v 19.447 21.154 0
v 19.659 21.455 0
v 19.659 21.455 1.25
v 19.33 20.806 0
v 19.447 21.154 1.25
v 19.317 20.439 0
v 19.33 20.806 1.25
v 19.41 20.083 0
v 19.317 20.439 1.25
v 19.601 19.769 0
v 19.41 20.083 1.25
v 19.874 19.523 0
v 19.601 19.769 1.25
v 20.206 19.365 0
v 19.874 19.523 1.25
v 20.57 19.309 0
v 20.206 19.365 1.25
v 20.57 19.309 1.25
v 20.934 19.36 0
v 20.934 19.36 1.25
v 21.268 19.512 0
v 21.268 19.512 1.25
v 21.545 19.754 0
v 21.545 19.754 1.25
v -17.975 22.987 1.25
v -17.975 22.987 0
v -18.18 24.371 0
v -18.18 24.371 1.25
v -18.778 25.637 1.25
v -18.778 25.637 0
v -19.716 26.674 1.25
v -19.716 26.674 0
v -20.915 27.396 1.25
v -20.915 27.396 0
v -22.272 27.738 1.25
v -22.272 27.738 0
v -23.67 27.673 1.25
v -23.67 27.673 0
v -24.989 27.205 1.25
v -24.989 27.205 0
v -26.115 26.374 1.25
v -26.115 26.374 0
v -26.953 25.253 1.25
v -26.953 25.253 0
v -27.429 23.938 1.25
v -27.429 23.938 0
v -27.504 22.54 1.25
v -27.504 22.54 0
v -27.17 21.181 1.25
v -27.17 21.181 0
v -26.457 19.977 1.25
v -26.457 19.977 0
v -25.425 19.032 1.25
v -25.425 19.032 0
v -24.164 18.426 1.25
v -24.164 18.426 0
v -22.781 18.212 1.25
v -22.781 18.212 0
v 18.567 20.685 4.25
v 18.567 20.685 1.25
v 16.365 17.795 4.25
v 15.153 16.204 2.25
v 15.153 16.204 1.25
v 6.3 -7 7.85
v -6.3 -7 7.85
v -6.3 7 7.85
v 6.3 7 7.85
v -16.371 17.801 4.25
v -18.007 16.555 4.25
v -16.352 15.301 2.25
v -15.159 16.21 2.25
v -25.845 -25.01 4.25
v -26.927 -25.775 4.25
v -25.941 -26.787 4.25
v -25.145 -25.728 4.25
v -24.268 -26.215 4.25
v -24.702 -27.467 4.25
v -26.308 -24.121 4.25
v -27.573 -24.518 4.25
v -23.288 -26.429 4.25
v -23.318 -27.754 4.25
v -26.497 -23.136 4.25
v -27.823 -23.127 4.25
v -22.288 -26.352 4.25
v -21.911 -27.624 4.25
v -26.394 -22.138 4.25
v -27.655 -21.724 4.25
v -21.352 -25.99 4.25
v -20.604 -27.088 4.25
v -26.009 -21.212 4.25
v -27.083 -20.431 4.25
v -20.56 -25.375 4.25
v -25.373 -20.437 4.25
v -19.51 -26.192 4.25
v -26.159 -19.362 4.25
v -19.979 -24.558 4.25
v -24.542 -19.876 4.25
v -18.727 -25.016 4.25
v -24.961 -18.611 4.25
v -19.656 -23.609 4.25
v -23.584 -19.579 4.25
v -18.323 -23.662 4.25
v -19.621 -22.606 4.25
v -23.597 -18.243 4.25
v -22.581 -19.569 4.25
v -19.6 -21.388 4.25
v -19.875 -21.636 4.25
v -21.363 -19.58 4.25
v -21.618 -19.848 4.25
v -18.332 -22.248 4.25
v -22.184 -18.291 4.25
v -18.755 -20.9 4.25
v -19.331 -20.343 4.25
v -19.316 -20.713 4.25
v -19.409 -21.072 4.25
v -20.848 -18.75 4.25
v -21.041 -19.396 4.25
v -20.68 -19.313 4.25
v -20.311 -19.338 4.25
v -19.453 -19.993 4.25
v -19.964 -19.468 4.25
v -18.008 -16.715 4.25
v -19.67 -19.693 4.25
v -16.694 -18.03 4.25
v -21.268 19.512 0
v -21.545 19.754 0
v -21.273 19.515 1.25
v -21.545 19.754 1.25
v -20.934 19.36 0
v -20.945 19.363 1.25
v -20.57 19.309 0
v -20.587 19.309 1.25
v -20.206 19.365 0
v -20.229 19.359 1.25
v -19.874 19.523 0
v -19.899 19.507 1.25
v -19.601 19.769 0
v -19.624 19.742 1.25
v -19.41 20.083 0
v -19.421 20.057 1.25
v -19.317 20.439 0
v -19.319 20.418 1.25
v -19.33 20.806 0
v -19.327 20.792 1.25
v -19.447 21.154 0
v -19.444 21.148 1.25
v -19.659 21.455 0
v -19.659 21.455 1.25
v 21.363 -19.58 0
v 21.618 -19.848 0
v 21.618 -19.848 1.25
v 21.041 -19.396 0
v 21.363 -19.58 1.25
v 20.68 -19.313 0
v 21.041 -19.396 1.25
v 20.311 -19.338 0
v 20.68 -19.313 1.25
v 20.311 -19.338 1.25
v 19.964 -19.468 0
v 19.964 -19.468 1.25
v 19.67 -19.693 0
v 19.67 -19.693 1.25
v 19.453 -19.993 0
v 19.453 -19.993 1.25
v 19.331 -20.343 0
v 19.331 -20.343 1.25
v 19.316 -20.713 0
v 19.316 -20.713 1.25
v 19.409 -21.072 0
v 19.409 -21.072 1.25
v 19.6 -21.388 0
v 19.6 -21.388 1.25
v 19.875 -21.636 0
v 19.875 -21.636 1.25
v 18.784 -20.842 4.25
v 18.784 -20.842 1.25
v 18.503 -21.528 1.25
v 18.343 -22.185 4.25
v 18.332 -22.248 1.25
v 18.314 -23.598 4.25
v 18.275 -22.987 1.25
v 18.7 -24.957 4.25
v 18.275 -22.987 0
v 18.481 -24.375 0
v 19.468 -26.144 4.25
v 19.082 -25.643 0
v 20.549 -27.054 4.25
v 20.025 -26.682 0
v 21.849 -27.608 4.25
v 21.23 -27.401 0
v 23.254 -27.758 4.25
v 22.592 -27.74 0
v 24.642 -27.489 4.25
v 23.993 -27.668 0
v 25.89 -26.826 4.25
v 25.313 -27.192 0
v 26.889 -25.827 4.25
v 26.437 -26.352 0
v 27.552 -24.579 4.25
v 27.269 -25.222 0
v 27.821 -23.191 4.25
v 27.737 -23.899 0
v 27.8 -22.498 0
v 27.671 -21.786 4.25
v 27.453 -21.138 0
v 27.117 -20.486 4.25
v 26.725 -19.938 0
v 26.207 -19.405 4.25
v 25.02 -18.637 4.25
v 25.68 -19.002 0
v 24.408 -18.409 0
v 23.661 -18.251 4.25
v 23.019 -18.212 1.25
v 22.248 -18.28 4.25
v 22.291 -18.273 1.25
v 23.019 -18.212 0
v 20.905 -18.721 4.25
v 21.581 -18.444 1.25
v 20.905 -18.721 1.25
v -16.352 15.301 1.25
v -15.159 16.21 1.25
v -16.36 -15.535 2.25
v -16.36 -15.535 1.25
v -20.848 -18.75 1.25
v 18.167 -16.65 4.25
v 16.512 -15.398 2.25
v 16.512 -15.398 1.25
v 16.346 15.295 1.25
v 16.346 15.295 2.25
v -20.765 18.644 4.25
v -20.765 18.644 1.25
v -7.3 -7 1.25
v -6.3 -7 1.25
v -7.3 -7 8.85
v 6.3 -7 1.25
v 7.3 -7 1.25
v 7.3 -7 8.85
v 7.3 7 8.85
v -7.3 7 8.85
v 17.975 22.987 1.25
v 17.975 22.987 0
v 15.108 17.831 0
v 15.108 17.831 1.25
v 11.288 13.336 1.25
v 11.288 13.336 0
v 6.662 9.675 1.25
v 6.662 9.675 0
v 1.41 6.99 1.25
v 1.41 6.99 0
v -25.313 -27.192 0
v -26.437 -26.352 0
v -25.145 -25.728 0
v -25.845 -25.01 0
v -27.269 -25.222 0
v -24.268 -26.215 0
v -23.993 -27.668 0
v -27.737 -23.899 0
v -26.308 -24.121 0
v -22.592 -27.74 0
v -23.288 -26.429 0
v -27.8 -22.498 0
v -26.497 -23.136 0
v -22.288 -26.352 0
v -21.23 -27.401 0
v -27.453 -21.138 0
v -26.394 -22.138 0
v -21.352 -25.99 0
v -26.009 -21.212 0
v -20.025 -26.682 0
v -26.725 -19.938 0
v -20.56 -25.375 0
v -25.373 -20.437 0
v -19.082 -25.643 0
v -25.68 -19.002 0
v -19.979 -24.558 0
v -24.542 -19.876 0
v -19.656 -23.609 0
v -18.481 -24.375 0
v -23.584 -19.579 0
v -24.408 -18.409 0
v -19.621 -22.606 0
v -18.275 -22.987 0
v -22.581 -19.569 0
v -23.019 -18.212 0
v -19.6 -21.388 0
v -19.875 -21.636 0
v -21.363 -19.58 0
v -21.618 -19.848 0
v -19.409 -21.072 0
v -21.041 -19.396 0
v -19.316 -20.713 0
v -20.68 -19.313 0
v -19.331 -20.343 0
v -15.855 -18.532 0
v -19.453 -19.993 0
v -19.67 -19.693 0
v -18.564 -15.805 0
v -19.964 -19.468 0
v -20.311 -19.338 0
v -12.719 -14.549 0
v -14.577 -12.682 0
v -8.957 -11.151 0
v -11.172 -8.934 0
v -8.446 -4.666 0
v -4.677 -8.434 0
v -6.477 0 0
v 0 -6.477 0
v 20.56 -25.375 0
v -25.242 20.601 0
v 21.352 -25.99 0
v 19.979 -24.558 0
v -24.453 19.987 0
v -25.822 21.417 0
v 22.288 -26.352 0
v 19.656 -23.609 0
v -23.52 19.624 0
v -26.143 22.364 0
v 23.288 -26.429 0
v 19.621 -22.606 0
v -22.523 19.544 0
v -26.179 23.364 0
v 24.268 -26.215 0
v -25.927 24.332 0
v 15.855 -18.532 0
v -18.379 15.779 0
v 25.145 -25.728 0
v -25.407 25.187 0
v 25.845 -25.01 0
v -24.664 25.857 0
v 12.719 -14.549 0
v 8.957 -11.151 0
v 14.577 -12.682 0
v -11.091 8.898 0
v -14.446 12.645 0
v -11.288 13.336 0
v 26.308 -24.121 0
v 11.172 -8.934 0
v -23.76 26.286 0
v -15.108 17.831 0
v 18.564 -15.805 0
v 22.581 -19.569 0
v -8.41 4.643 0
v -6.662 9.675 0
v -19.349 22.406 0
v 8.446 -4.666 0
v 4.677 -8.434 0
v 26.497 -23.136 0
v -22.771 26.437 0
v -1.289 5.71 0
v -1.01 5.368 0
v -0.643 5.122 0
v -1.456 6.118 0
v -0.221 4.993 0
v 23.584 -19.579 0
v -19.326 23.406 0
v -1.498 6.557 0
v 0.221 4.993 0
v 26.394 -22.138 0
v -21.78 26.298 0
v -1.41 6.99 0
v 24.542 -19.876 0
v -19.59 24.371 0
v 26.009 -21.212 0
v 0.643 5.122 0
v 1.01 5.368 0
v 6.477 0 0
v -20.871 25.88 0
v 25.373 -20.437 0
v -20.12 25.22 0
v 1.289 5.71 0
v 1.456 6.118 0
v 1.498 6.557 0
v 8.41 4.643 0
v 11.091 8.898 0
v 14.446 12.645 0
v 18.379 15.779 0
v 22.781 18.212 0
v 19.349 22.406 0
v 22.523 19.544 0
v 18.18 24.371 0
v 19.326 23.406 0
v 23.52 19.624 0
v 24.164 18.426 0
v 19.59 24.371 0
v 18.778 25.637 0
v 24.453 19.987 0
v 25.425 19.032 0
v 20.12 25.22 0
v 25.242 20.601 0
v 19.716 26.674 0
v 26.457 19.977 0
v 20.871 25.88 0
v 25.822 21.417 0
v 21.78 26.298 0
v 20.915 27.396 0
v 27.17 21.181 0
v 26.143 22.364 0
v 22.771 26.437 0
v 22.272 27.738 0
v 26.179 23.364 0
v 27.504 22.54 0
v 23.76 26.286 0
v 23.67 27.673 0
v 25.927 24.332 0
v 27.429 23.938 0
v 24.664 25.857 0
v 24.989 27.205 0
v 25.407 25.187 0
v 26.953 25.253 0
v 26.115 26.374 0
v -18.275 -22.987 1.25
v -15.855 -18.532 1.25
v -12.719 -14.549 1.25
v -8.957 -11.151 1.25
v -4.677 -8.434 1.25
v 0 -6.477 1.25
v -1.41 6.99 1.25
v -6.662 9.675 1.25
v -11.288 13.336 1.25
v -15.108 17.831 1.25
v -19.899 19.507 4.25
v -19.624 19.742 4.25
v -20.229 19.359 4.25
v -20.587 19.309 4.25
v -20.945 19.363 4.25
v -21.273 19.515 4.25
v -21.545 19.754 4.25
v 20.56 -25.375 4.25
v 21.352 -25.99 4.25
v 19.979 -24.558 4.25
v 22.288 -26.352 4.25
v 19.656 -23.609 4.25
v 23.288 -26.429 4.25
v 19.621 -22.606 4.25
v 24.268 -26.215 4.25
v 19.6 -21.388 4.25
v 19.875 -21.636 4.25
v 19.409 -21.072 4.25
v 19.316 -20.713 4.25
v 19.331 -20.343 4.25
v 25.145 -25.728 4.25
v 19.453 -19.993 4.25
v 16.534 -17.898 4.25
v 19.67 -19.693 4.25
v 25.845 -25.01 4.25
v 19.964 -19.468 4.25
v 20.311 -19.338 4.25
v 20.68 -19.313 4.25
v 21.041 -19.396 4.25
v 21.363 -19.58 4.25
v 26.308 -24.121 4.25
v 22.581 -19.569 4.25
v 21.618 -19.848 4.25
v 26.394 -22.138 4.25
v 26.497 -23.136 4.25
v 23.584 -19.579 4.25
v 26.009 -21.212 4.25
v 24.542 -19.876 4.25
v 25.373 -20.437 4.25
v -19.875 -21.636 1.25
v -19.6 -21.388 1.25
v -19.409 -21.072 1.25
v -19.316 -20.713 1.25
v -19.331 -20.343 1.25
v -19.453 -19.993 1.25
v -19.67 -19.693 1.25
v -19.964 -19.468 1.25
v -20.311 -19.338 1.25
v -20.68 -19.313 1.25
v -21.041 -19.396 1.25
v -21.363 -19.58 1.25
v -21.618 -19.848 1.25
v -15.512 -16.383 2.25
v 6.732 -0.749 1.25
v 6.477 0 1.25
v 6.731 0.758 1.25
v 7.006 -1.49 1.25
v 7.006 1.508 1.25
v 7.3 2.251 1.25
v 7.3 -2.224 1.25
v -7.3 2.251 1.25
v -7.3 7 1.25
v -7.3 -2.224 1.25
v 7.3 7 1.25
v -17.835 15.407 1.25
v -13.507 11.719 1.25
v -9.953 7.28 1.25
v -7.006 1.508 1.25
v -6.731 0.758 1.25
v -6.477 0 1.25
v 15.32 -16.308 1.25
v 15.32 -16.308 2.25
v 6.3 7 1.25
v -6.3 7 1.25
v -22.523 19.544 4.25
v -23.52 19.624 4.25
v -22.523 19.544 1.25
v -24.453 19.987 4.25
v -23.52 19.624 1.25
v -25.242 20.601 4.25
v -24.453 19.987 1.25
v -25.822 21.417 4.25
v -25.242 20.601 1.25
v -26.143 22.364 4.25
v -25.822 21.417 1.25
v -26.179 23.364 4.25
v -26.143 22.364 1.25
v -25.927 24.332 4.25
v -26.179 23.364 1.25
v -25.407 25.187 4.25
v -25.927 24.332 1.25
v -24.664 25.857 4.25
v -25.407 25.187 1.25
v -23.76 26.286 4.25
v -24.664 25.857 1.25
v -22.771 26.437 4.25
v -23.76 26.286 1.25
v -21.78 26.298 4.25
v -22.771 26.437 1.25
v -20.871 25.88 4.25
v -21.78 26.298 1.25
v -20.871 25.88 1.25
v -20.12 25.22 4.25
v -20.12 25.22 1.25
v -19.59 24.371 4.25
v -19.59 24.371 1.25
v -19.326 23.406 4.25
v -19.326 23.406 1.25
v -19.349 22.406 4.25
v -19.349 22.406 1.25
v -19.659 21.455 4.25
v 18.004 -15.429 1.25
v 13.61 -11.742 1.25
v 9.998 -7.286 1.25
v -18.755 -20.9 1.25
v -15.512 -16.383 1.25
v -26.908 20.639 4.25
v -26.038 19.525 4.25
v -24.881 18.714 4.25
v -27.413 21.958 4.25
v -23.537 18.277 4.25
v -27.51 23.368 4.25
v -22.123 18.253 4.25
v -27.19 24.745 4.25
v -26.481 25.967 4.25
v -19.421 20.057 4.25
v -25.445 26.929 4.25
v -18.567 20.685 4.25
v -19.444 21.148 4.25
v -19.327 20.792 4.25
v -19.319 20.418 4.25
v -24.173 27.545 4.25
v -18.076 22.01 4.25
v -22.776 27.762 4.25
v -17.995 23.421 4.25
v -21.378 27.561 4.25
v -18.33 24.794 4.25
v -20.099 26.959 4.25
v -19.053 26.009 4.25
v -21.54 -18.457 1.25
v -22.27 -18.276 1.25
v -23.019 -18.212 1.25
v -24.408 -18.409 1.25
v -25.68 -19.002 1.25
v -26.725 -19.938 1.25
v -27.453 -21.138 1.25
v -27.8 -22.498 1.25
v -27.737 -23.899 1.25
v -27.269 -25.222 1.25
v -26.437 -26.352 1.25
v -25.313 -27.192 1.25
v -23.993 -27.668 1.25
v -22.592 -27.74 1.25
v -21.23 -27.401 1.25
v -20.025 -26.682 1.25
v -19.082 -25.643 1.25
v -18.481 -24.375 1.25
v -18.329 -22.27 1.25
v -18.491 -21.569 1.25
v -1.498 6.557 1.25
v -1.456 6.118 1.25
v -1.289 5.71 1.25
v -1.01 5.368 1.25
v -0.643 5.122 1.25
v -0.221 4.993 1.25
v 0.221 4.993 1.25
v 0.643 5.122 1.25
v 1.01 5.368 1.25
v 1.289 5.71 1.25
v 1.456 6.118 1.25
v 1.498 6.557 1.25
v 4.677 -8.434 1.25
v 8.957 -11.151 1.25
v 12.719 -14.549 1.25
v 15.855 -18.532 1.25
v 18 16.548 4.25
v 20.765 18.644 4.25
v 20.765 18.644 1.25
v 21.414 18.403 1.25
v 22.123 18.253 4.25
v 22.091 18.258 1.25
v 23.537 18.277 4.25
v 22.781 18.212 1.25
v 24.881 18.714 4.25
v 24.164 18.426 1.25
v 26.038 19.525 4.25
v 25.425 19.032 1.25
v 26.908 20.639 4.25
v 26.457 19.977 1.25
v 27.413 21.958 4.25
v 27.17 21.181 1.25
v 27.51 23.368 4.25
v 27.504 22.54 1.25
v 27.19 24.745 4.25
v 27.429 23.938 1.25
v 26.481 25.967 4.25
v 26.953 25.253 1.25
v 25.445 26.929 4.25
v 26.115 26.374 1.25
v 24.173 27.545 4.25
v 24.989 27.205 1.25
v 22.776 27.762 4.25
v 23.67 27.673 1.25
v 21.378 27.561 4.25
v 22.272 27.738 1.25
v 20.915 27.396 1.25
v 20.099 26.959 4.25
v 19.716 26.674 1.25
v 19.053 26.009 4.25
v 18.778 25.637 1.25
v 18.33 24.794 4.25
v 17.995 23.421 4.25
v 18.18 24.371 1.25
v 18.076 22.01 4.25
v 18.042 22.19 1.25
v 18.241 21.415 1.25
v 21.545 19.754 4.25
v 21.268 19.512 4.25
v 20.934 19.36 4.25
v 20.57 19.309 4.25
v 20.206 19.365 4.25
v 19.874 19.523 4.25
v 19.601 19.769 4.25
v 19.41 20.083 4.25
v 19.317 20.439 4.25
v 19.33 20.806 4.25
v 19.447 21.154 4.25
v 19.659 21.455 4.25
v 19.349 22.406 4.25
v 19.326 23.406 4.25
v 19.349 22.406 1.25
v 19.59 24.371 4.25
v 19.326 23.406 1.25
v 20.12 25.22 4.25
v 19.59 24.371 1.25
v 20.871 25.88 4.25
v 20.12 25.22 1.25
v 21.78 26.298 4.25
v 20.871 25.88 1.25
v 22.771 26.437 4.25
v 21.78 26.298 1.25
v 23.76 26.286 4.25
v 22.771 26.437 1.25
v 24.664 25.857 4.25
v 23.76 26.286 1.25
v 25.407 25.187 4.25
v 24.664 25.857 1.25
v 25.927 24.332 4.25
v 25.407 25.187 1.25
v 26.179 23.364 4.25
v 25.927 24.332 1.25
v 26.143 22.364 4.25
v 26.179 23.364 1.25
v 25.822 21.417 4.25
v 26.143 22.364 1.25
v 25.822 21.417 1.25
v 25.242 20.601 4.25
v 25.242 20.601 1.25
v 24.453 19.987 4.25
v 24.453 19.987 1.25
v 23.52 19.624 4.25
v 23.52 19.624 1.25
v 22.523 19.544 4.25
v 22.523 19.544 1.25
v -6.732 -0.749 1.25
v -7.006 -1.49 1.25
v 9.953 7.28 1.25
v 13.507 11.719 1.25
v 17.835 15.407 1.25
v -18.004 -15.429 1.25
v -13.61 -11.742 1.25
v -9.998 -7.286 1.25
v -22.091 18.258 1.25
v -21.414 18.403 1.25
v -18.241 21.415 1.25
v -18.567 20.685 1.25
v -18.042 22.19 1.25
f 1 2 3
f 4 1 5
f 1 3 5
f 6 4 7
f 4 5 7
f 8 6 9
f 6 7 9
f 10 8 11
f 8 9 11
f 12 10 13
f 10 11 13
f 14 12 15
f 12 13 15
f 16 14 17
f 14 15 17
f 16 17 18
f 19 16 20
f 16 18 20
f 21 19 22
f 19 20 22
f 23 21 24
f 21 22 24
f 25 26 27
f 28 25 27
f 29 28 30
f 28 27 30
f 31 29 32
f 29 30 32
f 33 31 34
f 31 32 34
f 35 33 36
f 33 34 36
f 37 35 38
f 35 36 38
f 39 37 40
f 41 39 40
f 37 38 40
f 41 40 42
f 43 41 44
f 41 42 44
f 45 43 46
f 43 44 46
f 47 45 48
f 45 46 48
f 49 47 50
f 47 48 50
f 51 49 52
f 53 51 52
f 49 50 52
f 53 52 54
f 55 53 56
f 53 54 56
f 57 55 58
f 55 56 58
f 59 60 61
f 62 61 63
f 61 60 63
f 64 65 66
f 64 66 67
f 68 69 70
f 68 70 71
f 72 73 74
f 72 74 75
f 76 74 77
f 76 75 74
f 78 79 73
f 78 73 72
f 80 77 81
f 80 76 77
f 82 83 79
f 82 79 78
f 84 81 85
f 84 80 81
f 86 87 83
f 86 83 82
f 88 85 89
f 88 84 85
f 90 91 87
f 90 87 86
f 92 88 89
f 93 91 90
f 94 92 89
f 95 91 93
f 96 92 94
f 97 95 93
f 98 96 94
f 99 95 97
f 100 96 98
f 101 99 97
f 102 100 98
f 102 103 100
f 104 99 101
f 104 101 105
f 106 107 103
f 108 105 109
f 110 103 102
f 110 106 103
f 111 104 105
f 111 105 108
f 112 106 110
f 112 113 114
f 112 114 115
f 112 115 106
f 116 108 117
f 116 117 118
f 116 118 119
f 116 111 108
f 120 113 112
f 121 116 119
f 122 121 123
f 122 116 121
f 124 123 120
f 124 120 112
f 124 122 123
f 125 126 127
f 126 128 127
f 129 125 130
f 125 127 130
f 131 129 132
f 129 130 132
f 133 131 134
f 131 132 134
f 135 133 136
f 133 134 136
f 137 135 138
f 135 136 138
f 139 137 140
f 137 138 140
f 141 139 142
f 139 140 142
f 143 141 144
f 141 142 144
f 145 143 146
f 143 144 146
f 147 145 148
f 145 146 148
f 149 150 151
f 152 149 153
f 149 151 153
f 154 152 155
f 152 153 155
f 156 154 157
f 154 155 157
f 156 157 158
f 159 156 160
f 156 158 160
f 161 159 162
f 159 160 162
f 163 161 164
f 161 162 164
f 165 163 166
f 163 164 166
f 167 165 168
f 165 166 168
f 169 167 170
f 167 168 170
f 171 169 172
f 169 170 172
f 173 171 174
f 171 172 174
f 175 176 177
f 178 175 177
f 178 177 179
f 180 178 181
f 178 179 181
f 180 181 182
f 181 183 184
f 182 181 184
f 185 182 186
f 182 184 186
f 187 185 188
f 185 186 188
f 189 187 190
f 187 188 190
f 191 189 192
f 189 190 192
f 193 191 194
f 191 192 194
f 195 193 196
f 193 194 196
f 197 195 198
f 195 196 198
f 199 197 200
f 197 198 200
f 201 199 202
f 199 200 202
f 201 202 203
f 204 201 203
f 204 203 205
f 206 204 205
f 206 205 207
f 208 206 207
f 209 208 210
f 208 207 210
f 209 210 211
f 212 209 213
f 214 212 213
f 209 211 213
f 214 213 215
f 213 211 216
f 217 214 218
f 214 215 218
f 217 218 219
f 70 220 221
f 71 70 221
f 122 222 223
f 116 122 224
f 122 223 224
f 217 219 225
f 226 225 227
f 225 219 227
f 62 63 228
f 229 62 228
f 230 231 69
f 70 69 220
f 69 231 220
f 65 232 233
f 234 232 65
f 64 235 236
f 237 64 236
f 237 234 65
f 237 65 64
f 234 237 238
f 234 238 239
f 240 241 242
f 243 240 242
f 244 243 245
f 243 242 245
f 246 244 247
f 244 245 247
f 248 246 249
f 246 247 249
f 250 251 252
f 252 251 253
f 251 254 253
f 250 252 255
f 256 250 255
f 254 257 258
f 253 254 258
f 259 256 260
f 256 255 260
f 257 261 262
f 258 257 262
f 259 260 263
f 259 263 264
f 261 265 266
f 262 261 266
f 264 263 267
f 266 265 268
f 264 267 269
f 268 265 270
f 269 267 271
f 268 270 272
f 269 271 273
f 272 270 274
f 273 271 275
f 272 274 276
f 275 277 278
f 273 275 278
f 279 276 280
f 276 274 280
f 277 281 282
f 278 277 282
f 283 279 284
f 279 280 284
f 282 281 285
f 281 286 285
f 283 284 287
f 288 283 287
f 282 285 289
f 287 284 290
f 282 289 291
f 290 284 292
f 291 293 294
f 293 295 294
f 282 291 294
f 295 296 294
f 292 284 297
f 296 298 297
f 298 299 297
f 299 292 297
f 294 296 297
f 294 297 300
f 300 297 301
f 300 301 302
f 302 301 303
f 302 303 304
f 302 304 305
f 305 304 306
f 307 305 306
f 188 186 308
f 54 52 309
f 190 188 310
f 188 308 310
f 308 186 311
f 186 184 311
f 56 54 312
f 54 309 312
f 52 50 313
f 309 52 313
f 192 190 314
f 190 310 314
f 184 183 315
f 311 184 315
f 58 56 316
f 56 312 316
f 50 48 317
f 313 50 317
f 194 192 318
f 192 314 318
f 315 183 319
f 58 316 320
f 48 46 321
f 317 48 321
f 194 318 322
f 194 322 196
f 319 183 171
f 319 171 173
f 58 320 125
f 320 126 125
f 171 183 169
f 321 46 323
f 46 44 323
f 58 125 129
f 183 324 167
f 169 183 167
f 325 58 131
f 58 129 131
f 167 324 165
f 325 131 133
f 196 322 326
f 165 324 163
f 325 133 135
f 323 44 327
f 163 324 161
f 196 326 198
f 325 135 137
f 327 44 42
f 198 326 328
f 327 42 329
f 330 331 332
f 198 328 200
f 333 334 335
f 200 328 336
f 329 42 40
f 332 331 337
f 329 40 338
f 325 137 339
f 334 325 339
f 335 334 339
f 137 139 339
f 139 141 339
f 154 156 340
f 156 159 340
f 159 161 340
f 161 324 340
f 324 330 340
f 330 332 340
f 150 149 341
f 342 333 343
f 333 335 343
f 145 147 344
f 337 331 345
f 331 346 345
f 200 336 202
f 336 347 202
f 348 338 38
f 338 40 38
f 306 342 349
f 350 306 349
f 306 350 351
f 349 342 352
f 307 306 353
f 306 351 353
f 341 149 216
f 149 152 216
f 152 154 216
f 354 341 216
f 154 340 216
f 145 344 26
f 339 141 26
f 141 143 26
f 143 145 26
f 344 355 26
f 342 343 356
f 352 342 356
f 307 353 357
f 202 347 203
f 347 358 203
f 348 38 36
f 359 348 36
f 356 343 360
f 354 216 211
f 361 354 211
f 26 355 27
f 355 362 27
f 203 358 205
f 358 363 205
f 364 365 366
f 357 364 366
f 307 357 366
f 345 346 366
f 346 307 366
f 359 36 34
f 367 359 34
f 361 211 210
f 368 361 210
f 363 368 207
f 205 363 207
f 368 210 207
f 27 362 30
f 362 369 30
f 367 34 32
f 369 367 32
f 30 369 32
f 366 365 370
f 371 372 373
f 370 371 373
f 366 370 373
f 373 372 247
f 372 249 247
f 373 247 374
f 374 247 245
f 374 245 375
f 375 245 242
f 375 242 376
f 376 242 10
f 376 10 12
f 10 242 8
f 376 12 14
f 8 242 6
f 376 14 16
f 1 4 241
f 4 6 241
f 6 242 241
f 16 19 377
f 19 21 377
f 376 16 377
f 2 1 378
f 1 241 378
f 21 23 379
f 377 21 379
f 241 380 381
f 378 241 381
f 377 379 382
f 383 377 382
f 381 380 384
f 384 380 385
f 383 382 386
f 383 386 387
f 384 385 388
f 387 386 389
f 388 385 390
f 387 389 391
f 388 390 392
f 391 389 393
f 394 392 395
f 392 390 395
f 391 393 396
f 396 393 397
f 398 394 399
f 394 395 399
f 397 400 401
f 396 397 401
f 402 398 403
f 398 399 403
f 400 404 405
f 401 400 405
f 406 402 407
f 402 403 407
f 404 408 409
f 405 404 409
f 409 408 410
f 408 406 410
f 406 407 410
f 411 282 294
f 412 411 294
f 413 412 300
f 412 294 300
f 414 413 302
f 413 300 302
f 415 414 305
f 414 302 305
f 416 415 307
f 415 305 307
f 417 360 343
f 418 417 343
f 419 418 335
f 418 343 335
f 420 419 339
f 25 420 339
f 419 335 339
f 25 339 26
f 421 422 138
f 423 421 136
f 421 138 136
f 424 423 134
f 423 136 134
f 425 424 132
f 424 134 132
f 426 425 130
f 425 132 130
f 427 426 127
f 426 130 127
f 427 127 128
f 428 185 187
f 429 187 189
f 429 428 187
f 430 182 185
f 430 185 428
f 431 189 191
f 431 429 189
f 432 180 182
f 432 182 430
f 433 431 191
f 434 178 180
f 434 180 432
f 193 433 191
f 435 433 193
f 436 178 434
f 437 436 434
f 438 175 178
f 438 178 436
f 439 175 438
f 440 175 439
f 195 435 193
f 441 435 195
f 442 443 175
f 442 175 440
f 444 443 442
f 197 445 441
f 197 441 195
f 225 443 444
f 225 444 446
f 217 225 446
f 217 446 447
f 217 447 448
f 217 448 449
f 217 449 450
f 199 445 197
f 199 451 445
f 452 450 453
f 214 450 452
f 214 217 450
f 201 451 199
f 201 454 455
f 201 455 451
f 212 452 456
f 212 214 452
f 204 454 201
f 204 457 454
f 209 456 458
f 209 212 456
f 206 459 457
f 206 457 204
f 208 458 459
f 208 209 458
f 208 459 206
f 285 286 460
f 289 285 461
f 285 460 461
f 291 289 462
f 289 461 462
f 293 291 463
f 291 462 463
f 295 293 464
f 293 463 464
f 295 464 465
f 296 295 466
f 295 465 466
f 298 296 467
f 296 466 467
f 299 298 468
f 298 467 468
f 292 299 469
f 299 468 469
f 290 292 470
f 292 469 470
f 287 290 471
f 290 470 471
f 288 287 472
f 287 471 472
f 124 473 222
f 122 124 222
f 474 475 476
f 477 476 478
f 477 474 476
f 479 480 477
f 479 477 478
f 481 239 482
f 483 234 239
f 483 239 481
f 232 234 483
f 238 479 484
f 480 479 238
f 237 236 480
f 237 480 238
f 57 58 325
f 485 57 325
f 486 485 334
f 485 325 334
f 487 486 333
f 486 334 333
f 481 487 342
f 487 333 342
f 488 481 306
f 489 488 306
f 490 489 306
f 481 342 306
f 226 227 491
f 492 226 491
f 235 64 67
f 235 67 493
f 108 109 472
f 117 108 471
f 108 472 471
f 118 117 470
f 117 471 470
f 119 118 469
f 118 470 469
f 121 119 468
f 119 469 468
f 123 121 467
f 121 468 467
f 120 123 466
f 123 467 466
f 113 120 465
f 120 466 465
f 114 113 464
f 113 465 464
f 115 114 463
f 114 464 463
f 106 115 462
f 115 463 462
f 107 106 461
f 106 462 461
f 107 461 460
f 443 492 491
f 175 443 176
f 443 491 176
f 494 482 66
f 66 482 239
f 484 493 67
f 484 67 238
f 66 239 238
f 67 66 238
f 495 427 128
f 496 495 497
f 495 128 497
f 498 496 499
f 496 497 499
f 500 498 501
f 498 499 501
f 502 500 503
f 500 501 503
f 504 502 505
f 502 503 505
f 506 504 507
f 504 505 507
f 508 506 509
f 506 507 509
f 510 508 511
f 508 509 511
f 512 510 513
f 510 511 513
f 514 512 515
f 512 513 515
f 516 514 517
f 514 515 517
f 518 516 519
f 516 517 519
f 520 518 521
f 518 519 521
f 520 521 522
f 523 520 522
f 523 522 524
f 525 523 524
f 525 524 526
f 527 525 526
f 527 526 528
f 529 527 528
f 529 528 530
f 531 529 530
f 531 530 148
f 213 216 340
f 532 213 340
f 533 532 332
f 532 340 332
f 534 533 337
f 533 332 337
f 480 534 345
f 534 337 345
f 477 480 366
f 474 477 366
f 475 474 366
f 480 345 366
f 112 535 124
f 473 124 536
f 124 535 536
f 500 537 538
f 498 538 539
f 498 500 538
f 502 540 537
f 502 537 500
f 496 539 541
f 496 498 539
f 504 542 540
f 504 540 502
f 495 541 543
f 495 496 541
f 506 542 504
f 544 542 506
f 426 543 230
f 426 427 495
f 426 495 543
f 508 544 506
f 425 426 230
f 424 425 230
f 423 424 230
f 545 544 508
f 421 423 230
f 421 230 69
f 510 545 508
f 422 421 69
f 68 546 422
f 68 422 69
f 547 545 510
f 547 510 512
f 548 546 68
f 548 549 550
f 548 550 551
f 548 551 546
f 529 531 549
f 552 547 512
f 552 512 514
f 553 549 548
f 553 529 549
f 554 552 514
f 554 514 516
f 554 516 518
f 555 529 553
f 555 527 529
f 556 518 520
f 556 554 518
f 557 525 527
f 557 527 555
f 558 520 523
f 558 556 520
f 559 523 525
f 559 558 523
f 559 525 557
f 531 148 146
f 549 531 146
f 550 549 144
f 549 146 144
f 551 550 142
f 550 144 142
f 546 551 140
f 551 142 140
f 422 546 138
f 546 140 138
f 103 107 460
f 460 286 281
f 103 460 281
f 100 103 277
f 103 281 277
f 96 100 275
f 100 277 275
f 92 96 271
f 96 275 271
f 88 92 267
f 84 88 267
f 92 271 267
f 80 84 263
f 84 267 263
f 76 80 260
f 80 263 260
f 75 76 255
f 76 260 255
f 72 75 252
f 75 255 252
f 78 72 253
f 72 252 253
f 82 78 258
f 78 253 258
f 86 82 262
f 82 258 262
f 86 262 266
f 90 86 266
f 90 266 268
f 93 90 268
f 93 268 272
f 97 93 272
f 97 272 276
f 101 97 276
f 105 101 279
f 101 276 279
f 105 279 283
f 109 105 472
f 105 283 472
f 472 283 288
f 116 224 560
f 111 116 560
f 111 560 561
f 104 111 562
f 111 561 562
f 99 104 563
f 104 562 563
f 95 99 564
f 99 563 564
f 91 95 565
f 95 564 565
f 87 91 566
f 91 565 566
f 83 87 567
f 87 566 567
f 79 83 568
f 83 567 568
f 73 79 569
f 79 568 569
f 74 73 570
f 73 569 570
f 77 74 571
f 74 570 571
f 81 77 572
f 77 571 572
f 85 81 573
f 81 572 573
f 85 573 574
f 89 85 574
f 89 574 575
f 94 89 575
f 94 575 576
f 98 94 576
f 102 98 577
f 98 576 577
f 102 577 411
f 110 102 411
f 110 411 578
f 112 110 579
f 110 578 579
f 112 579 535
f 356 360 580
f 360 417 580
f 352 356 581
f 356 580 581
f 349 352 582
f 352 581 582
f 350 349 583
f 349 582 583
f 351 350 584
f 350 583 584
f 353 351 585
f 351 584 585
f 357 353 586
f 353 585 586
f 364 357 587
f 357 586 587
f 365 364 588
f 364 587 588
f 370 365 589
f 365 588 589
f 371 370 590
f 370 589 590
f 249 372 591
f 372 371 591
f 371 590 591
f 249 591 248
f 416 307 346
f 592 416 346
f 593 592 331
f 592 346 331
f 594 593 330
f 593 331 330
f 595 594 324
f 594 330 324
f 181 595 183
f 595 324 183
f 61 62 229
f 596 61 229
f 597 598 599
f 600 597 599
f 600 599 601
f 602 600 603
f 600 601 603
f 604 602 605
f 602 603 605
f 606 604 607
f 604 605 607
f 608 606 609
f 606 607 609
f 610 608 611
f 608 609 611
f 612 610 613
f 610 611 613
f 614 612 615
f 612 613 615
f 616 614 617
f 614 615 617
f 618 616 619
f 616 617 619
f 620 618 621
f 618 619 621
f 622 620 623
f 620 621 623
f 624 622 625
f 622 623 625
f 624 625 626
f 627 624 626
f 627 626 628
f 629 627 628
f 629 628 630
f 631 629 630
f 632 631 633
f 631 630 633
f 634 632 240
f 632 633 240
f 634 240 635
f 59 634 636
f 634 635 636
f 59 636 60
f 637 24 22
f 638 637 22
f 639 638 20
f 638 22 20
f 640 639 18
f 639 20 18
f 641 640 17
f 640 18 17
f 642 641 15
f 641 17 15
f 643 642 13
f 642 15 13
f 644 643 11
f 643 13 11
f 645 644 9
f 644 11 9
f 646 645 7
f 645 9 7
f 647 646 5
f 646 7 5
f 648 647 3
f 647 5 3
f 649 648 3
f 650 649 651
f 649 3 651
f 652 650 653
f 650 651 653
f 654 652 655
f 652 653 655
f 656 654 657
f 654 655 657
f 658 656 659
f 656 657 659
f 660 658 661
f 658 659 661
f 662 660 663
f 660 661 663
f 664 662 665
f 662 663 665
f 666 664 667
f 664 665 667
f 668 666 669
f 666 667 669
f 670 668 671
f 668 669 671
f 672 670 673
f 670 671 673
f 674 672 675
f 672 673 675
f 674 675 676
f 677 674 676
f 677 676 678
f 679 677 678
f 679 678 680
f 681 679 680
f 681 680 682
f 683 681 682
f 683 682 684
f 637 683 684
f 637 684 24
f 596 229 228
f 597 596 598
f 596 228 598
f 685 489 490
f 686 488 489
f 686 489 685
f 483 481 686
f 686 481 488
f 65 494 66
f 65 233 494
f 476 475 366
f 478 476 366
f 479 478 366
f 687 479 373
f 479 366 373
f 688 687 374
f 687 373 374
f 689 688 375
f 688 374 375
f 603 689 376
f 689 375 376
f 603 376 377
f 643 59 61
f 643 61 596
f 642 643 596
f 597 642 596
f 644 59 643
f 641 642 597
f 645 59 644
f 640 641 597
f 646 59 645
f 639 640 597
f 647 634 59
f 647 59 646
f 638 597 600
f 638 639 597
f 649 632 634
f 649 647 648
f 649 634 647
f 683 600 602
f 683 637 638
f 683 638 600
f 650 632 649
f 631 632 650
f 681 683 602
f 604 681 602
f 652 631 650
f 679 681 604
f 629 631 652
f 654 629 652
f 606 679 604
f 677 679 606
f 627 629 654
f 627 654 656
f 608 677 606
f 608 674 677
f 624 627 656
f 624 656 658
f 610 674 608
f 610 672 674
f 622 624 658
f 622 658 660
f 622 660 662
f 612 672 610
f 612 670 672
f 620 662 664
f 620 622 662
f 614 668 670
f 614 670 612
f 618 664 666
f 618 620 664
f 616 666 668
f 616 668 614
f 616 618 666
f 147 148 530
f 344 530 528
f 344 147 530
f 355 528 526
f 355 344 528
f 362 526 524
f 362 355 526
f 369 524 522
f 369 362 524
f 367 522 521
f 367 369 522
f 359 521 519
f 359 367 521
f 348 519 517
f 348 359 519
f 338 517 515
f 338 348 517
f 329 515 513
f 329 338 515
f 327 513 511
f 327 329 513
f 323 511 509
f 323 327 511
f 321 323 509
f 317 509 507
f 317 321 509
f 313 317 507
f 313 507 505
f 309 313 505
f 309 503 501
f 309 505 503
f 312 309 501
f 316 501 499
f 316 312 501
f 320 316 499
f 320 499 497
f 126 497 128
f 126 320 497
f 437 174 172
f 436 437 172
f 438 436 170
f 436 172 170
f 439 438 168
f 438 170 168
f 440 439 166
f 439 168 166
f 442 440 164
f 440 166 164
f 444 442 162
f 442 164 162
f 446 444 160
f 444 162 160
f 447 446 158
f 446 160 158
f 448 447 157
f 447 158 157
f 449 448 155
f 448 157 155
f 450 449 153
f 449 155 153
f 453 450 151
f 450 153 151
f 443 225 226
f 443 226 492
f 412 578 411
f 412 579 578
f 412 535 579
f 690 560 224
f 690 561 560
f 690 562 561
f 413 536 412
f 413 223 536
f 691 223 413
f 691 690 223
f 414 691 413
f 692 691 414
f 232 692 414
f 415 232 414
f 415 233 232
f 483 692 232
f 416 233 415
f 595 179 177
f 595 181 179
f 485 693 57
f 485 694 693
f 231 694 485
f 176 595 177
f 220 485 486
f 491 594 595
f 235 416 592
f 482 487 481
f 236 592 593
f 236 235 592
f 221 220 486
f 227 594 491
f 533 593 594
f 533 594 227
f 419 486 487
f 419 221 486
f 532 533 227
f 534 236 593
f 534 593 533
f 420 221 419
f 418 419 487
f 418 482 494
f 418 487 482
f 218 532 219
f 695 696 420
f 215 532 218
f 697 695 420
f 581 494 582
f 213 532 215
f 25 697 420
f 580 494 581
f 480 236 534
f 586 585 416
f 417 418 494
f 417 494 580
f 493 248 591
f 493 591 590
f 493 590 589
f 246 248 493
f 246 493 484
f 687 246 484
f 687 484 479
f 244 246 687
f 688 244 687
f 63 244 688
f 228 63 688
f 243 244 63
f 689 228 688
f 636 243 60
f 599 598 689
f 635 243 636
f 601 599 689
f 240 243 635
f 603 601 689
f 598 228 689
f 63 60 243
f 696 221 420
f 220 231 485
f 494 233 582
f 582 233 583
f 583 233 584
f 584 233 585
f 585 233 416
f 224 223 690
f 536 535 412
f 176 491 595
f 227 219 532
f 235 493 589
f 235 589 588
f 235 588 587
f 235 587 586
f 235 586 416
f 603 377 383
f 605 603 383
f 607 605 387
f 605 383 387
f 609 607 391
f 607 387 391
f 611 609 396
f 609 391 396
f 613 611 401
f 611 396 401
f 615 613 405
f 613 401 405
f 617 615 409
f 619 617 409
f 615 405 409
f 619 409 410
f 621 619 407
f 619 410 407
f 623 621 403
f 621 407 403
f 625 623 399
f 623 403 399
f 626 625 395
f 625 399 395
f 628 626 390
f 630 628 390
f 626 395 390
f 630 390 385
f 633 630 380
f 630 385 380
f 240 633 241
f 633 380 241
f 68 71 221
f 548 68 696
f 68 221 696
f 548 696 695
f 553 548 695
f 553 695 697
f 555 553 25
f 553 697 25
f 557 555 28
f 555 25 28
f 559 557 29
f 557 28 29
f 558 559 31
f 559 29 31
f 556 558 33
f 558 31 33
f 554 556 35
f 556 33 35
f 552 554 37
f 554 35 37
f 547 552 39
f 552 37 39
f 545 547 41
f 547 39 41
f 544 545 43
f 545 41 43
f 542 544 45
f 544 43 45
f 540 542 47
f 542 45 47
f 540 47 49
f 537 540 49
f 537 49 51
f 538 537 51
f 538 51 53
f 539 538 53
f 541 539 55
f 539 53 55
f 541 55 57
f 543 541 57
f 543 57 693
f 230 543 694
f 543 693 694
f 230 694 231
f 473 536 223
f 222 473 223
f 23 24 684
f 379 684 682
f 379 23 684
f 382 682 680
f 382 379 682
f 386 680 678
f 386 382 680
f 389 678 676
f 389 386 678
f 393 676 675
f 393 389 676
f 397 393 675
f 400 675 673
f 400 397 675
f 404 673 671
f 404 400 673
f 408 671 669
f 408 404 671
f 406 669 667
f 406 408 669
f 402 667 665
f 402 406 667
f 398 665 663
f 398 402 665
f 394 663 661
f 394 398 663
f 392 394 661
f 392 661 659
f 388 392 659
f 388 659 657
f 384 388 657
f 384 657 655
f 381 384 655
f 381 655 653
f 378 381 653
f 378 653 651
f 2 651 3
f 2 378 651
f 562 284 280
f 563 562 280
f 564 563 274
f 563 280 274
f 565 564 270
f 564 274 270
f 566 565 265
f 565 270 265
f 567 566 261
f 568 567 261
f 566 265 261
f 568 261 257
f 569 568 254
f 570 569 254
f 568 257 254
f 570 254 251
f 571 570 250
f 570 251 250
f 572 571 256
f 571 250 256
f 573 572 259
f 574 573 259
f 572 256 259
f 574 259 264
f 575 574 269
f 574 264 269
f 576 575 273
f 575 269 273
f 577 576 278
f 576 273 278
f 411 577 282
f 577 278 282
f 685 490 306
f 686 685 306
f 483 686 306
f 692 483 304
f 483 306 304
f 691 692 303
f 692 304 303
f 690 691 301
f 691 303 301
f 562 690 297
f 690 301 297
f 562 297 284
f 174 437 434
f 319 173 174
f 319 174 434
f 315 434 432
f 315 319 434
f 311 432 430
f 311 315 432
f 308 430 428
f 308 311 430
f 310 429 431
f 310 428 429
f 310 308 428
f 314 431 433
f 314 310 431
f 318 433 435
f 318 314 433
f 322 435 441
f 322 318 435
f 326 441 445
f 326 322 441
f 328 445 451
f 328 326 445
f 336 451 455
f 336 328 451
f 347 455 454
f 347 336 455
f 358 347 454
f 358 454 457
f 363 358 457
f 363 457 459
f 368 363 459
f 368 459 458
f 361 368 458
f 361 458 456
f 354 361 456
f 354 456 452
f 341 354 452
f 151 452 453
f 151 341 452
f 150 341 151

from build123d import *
from build123d import SkipClean  # not in build123d's __all__

# Parameters (mm, degrees)
F0_R     = 3.45
F1_DEPTH = 1.25
F2_R     = 1.27
F3_DEPTH = 15.24
F5_DEPTH = 7
F6_R     = 1.5
F7_DEPTH = 1.25
F9_DEPTH = 3
F10_SIZE = 2


# Not quite as in the source:
# - a feature of the source that left no trace in its solid (it failed there, or was rolled back) is left out


with BuildPart() as f1:
    # F0 (on Top) → F1 (new body)
    with BuildSketch(Plane.XY):
        with BuildLine():
            ThreePointArc((0, 6.477), (-10.7423411653, 12.8214445823), (-17.975, 22.987))
            ThreePointArc((-17.975, 22.987), (-26.1154007446, 26.3744330736), (-22.7811582525, 18.2121016594))
            ThreePointArc((-22.7811582525, 18.2121016594), (-12.6900771407, 10.8419183213), (-6.477, 0))
            ThreePointArc((-6.477, 0), (-12.7950799481, -10.8797937043), (-23.0188417475, -18.2121016594))
            ThreePointArc((-23.0188417475, -18.2121016594), (-26.4374330736, -26.3524007446), (-18.275, -22.987))
            ThreePointArc((-18.275, -22.987), (-10.9098200432, -12.770210249), (0, -6.477))
            ThreePointArc((0, -6.477), (10.9098200432, -12.770210249), (18.275, -22.987))
            ThreePointArc((18.275, -22.987), (26.4374330736, -26.3524007446), (23.0188417475, -18.2121016594))
            ThreePointArc((23.0188417475, -18.2121016594), (12.7950799481, -10.8797937043), (6.477, 0))
            ThreePointArc((6.477, 0), (12.6900771407, 10.8419183213), (22.7811582525, 18.2121016594))
            ThreePointArc((22.7811582525, 18.2121016594), (26.1154007446, 26.3744330736), (17.975, 22.987))
            ThreePointArc((17.975, 22.987), (10.7423411653, 12.8214445823), (0, 6.477))
        make_face()
        with Locations((-23.05, -22.987)):
            Circle(F0_R, mode=Mode.SUBTRACT)
        with Locations((23.05, -22.987)):
            Circle(F0_R, mode=Mode.SUBTRACT)
        with Locations((-22.75, 22.987)):
            Circle(F0_R, mode=Mode.SUBTRACT)
        with Locations((22.75, 22.987)):
            Circle(F0_R, mode=Mode.SUBTRACT)
    extrude(amount=F1_DEPTH)

    # F2 (on face) → F3 (cut)
    with BuildSketch(Plane.XY.offset(1.25)):
        with Locations((-20.5791849834, 20.5791849834)):
            Circle(F2_R)
        with Locations((20.5791849834, 20.5791849834)):
            Circle(F2_R)
        with Locations((20.5791849834, -20.5791849834)):
            Circle(F2_R)
        with Locations((-20.5791849834, -20.5791849834)):
            Circle(F2_R)
    extrude(amount=-F3_DEPTH, mode=Mode.SUBTRACT)

    # F4 (on Front) → F5 (join, symmetric)
    with BuildSketch(Plane.XZ):
        Polygon((-6.3, 1.25), (-6.3, 7.85), (6.3, 7.85), (6.3, 1.25), (7.3, 1.25), (7.3, 8.85), (-7.3, 8.85), (-7.3, 1.25), align=None)
    extrude(amount=F5_DEPTH, both=True)

    # F6 (on face) → F7 (cut, through all)
    with BuildSketch(Plane.XY.offset(1.25)):
        with Locations((0, 6.477)):
            Circle(F6_R)
    extrude(amount=-F7_DEPTH, mode=Mode.SUBTRACT)

    # F8 (on face) → F9 (join)
    with BuildSketch(Plane.XY.offset(1.25)):
        with BuildLine():
            Line((-16.3602319323, -15.5348950992), (-20.8478584952, -18.7501146118))
            ThreePointArc((-20.8478584952, -18.7501146118), (-26.4716233511, -26.3176333696), (-18.7553139698, -20.8998256177))
            Line((-18.7553139698, -20.8998256177), (-15.5117037948, -16.3834232366))
            Line((-15.5117037948, -16.3834232366), (-16.3602319323, -15.5348950992))
        make_face()
        with BuildLine():
            ThreePointArc((-19.8753821862, -21.6363328551), (-25.5208150166, -25.3948150166), (-21.6178063096, -19.8483185518))
            ThreePointArc((-21.6178063096, -19.8483185518), (-19.669638586, -19.6928298904), (-19.8753821862, -21.6363328551))
        make_face(mode=Mode.SUBTRACT)
        with BuildLine():
            Line((15.3199540065, -16.3082468694), (18.7838269987, -20.8421473423))
            ThreePointArc((18.7838269987, -20.8421473423), (26.4264348802, -26.3634348802), (20.9051473423, -18.7208269987))
            Line((20.9051473423, -18.7208269987), (16.5119000472, -15.3976071843))
            Line((16.5119000472, -15.3976071843), (15.3199540065, -16.3082468694))
        make_face()
        with BuildLine():
            ThreePointArc((21.6178063096, -19.8483185518), (25.5208150166, -25.3948150166), (19.8753821862, -21.6363328551))
            ThreePointArc((19.8753821862, -21.6363328551), (19.669638586, -19.6928298904), (21.6178063096, -19.8483185518))
        make_face(mode=Mode.SUBTRACT)
        with BuildLine():
            Line((16.3457305073, 15.2946304795), (20.7653185529, 18.6439982094))
            ThreePointArc((20.7653185529, 18.6439982094), (25.9985065626, 26.4866900024), (18.5665604362, 20.6849447408))
            Line((18.5665604362, 20.6849447408), (15.1525434236, 16.2036434514))
            Line((15.1525434236, 16.2036434514), (16.3457305073, 15.2946304795))
        make_face()
        with BuildLine():
            ThreePointArc((19.659038987, 21.4545313979), (25.0601507831, 25.5493628469), (21.5448562878, 19.7543341291))
            ThreePointArc((21.5448562878, 19.7543341291), (19.7287816517, 19.6359383702), (19.659038987, 21.4545313979))
        make_face(mode=Mode.SUBTRACT)
        with BuildLine():
            ThreePointArc((-18.5665604362, 20.6849447408), (-25.9985065626, 26.4866900024), (-20.7653185529, 18.6439982094))
            Line((-20.7653185529, 18.6439982094), (-16.3523570468, 15.30128828))
            Line((-16.3523570468, 15.30128828), (-15.1589701598, 16.2100389266))
            Line((-15.1589701598, 16.2100389266), (-18.5665604362, 20.6849447408))
        make_face()
        with BuildLine():
            ThreePointArc((-21.5448562878, 19.7543341291), (-25.0601507831, 25.5493628469), (-19.659038987, 21.4545313979))
            ThreePointArc((-19.659038987, 21.4545313979), (-19.3094528761, 20.6052689951), (-19.6238661036, 19.7423661036))
            ThreePointArc((-19.6238661036, 19.7423661036), (-20.5870970996, 19.30920963), (-21.5448562878, 19.7543341291))
        make_face(mode=Mode.SUBTRACT)
    with SkipClean():  # cleaning this boolean's faces spoils the solid; the shape is the same uncleaned
        extrude(amount=F9_DEPTH)

    # F10
    f10_edges = [f1.edges().sort_by_distance(p)[0] for p in [
        (-15.755664, 15.755664, 4.25),
        (-15.935968, -15.959159, 4.25),
        (15.915927, -15.852927, 4.25),
        (15.749137, 15.749137, 4.25),
    ]]
    chamfer(f10_edges, length=F10_SIZE)


solid = f1.part
